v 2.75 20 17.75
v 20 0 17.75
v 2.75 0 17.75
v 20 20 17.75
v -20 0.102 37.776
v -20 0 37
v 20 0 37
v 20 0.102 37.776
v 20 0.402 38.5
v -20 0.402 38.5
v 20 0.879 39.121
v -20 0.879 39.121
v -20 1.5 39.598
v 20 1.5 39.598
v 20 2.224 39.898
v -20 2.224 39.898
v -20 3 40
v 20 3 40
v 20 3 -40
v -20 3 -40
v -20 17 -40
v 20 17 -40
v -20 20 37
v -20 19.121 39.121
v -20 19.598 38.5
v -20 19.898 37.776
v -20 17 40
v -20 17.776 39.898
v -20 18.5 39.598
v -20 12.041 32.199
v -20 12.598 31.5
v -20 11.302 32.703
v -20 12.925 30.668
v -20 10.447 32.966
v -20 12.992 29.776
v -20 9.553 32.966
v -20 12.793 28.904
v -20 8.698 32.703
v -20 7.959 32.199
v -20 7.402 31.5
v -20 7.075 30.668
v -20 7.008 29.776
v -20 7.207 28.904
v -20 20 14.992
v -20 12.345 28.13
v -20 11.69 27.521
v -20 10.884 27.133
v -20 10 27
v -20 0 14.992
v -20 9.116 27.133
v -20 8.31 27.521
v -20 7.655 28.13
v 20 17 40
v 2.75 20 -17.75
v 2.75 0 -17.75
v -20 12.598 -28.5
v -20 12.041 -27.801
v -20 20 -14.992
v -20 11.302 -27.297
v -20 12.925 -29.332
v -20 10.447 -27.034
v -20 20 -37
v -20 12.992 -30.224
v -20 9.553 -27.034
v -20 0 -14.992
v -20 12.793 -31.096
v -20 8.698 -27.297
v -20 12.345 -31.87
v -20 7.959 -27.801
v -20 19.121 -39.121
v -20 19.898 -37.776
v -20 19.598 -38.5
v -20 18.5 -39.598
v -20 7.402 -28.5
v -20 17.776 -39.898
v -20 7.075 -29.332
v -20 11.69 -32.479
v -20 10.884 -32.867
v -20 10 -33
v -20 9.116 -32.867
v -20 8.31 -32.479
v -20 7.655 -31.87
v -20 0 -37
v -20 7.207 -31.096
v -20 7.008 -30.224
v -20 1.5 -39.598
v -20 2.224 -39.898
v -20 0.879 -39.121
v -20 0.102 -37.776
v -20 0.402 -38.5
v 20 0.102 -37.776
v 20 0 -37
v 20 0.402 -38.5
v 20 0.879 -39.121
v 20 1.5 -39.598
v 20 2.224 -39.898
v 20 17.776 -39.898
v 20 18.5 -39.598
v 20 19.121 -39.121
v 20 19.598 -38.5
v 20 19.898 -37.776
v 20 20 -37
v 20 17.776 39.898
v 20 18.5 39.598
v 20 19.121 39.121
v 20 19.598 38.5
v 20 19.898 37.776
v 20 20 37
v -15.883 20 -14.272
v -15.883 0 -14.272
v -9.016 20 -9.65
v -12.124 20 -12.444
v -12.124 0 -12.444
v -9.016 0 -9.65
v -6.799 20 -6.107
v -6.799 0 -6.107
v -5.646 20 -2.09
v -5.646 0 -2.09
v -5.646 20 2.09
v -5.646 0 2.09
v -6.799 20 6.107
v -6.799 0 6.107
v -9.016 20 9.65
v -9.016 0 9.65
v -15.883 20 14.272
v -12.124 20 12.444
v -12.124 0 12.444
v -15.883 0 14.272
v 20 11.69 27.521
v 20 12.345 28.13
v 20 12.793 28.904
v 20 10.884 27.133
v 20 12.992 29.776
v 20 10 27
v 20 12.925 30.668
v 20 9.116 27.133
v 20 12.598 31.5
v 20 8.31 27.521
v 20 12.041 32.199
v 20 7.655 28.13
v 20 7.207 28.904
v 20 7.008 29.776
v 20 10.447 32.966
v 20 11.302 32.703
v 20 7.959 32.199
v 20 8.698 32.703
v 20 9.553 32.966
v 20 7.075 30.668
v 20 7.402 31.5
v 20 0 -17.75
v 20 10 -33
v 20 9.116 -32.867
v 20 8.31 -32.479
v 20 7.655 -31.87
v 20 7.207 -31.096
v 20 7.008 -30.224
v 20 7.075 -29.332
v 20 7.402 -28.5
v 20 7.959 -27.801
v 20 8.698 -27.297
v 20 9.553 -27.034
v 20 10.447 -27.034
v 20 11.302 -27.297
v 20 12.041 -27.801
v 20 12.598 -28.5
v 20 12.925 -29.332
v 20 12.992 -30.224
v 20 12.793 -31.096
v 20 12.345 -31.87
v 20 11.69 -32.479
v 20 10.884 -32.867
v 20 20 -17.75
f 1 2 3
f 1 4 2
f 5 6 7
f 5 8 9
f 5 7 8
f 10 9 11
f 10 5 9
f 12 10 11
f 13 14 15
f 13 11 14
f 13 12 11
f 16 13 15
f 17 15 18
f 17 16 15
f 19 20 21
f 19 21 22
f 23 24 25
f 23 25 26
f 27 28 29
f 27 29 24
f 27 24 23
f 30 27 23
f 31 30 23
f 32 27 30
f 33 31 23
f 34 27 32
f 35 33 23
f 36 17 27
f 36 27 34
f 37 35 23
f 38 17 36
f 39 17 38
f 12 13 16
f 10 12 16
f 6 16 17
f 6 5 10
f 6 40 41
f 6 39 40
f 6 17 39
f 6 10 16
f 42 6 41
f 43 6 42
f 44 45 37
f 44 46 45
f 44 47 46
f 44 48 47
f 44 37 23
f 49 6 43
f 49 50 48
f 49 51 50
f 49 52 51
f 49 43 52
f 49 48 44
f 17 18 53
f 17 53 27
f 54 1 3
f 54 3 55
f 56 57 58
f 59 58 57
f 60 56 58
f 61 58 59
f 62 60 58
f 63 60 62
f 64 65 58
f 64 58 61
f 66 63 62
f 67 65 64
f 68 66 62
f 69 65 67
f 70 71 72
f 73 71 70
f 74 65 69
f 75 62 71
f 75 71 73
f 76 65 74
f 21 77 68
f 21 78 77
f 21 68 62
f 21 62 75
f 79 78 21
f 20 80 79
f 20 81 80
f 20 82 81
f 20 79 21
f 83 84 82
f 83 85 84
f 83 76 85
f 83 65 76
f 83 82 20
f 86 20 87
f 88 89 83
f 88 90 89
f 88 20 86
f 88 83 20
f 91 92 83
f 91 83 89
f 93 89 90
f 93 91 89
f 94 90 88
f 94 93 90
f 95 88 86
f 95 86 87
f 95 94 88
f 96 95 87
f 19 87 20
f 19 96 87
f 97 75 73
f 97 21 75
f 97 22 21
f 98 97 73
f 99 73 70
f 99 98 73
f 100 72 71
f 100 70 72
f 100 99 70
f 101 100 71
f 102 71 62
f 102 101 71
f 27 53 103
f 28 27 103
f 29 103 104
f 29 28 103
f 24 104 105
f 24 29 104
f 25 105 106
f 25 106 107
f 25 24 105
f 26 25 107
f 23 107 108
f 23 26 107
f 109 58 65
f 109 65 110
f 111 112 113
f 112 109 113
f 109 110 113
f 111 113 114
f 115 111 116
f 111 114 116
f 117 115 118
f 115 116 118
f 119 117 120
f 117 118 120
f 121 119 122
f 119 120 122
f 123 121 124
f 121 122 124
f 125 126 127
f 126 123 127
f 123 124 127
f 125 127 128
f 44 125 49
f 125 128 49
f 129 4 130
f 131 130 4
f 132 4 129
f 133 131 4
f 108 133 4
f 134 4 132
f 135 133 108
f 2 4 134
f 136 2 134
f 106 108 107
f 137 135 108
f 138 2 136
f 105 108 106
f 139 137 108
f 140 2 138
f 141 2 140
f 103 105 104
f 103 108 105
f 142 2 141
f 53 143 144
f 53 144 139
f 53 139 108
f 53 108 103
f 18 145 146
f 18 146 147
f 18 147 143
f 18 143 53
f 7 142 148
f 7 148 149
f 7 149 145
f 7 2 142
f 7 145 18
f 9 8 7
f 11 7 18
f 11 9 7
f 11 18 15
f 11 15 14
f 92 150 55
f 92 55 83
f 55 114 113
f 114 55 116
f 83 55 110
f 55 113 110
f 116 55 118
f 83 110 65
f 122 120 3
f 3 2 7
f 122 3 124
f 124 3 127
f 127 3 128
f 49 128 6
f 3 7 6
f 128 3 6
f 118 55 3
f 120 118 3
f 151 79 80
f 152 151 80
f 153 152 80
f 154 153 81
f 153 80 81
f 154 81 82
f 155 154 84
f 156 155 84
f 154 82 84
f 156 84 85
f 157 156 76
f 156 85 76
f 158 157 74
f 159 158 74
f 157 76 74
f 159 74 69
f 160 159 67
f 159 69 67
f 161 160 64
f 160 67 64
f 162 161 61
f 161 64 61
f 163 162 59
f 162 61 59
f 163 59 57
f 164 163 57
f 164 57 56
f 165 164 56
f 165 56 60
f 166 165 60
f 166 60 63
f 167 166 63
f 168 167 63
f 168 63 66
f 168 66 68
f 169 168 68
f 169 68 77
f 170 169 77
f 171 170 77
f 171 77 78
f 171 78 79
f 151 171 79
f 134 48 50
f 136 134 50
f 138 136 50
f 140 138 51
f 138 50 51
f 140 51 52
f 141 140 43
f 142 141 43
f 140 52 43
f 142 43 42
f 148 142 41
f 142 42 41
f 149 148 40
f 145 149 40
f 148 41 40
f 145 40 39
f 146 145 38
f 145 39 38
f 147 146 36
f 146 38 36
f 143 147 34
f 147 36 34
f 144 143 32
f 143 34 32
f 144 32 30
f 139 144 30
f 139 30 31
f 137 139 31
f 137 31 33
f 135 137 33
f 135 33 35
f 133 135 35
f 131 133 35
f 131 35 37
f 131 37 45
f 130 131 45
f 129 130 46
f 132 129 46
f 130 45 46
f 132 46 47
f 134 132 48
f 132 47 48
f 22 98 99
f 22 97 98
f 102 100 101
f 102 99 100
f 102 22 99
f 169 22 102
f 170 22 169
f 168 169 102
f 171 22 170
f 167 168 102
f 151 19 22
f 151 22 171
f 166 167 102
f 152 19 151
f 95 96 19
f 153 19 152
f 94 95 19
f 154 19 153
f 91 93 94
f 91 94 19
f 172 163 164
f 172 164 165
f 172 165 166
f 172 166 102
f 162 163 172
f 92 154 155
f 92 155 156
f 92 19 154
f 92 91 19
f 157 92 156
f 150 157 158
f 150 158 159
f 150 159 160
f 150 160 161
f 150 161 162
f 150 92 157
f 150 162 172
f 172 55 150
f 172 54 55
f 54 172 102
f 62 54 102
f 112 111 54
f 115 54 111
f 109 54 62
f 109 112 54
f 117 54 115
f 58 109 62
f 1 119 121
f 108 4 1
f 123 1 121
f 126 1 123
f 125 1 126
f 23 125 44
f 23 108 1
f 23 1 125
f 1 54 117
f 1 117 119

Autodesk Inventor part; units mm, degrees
ref_plane "YZ Plane" through (0, 0, 0) normal (1, 0, 0) x (0, 1, 0)
ref_plane "XZ Plane" through (0, 0, 0) normal (0, 1, 0) x (-1, 0, 0)
ref_plane "XY Plane" through (0, 0, 0) normal (0, 0, 1) x (1, 0, 0)
sketch "Sketch1" plane through (0, 0, 0) normal (0, 1, 0) x (-1, 0, 0)
  line L0 (-20, 40) -> (20, 40)
  line L1 (20, 40) -> (20, -40)
  line L2 (20, -40) -> (-20, -40)
  line L3 (-20, -40) -> (-20, 40)
  arc A0 (20, 14.9917) -> (20, -14.9917) centre (20.5, 0) ccw
  point P0 (0, 0)
  dimension "d0" = 80
  dimension "d1" = 40
  dimension "d2" = 40
  dimension "d3" = 20
  dimension "d4" = 30
  dimension "d22" = 0.5
extrude "Extrusion1" add sketch "Sketch1" along normal blind 20 contours L0 L1 A0 L2 L3
sketch "Sketch2" plane through (20, 0, 40) normal (1, 0, 0) x (0, 0, -1)
  line L0 (0, 0) -> (80, 0) projected
  line L1 (80, 0) -> (80, 20) projected
  line L2 (0, 20) -> (80, 20) projected
  line L3 (0, 0) -> (0, 20) projected
  point P0 (40, 0)
  point P1 (10, 10)
  point P2 (70, 10)
  dimension "d8" = 10
  dimension "d9" = 10
  dimension "d10" = 10
  dimension "d11" = 10
hole "Hole1" at (20, 10, 30) at (20, 10, -30) direction (-1, 0, 0) diameter 6 end through all
sketch "Sketch3" plane through (0, 20, 0) normal (0, 1, 0) x (1, 0, 0)
  line L0 (20, -40) -> (20, 40) projected
  line L1 (20, 40) -> (-20, 40) projected
  line L2 (-20, 40) -> (-20, 14.9917) projected
  arc A0 (-20, -14.9917) -> (-20, 14.9917) centre (-20.5, 0) ccw projected
  line L3 (-20, -14.9917) -> (-20, -40) projected
  line L4 (-20, -40) -> (20, -40) projected
  line L5 (20, -17.75) -> (2.75, -17.75)
  line L6 (2.75, -17.75) -> (2.75, 17.75)
  line L7 (2.75, 17.75) -> (20, 17.75)
  point P0 (0, 0)
  dimension "d19" = 17.25
  dimension "d20" = 35.5
  dimension "d21" = 17.75
extrude "Extrusion2" cut sketch "Sketch3" against normal through all contours L5 L6 L7 L0
fillet "Fillet1" radius 3 4 edges at (0, 20, 40) (0, 0, 40) (0, 20, -40) (0, 0, -40)
equation "\"d2\" = 0.5 * d0"
equation "\"d3\" = 0.5 * d1"
equation "\"d9\" = d8"
equation "\"d21\" = 0.5 * d20"
properties part number "3DP_ASA_Balcony_Mounting_Clamp_Mid"
